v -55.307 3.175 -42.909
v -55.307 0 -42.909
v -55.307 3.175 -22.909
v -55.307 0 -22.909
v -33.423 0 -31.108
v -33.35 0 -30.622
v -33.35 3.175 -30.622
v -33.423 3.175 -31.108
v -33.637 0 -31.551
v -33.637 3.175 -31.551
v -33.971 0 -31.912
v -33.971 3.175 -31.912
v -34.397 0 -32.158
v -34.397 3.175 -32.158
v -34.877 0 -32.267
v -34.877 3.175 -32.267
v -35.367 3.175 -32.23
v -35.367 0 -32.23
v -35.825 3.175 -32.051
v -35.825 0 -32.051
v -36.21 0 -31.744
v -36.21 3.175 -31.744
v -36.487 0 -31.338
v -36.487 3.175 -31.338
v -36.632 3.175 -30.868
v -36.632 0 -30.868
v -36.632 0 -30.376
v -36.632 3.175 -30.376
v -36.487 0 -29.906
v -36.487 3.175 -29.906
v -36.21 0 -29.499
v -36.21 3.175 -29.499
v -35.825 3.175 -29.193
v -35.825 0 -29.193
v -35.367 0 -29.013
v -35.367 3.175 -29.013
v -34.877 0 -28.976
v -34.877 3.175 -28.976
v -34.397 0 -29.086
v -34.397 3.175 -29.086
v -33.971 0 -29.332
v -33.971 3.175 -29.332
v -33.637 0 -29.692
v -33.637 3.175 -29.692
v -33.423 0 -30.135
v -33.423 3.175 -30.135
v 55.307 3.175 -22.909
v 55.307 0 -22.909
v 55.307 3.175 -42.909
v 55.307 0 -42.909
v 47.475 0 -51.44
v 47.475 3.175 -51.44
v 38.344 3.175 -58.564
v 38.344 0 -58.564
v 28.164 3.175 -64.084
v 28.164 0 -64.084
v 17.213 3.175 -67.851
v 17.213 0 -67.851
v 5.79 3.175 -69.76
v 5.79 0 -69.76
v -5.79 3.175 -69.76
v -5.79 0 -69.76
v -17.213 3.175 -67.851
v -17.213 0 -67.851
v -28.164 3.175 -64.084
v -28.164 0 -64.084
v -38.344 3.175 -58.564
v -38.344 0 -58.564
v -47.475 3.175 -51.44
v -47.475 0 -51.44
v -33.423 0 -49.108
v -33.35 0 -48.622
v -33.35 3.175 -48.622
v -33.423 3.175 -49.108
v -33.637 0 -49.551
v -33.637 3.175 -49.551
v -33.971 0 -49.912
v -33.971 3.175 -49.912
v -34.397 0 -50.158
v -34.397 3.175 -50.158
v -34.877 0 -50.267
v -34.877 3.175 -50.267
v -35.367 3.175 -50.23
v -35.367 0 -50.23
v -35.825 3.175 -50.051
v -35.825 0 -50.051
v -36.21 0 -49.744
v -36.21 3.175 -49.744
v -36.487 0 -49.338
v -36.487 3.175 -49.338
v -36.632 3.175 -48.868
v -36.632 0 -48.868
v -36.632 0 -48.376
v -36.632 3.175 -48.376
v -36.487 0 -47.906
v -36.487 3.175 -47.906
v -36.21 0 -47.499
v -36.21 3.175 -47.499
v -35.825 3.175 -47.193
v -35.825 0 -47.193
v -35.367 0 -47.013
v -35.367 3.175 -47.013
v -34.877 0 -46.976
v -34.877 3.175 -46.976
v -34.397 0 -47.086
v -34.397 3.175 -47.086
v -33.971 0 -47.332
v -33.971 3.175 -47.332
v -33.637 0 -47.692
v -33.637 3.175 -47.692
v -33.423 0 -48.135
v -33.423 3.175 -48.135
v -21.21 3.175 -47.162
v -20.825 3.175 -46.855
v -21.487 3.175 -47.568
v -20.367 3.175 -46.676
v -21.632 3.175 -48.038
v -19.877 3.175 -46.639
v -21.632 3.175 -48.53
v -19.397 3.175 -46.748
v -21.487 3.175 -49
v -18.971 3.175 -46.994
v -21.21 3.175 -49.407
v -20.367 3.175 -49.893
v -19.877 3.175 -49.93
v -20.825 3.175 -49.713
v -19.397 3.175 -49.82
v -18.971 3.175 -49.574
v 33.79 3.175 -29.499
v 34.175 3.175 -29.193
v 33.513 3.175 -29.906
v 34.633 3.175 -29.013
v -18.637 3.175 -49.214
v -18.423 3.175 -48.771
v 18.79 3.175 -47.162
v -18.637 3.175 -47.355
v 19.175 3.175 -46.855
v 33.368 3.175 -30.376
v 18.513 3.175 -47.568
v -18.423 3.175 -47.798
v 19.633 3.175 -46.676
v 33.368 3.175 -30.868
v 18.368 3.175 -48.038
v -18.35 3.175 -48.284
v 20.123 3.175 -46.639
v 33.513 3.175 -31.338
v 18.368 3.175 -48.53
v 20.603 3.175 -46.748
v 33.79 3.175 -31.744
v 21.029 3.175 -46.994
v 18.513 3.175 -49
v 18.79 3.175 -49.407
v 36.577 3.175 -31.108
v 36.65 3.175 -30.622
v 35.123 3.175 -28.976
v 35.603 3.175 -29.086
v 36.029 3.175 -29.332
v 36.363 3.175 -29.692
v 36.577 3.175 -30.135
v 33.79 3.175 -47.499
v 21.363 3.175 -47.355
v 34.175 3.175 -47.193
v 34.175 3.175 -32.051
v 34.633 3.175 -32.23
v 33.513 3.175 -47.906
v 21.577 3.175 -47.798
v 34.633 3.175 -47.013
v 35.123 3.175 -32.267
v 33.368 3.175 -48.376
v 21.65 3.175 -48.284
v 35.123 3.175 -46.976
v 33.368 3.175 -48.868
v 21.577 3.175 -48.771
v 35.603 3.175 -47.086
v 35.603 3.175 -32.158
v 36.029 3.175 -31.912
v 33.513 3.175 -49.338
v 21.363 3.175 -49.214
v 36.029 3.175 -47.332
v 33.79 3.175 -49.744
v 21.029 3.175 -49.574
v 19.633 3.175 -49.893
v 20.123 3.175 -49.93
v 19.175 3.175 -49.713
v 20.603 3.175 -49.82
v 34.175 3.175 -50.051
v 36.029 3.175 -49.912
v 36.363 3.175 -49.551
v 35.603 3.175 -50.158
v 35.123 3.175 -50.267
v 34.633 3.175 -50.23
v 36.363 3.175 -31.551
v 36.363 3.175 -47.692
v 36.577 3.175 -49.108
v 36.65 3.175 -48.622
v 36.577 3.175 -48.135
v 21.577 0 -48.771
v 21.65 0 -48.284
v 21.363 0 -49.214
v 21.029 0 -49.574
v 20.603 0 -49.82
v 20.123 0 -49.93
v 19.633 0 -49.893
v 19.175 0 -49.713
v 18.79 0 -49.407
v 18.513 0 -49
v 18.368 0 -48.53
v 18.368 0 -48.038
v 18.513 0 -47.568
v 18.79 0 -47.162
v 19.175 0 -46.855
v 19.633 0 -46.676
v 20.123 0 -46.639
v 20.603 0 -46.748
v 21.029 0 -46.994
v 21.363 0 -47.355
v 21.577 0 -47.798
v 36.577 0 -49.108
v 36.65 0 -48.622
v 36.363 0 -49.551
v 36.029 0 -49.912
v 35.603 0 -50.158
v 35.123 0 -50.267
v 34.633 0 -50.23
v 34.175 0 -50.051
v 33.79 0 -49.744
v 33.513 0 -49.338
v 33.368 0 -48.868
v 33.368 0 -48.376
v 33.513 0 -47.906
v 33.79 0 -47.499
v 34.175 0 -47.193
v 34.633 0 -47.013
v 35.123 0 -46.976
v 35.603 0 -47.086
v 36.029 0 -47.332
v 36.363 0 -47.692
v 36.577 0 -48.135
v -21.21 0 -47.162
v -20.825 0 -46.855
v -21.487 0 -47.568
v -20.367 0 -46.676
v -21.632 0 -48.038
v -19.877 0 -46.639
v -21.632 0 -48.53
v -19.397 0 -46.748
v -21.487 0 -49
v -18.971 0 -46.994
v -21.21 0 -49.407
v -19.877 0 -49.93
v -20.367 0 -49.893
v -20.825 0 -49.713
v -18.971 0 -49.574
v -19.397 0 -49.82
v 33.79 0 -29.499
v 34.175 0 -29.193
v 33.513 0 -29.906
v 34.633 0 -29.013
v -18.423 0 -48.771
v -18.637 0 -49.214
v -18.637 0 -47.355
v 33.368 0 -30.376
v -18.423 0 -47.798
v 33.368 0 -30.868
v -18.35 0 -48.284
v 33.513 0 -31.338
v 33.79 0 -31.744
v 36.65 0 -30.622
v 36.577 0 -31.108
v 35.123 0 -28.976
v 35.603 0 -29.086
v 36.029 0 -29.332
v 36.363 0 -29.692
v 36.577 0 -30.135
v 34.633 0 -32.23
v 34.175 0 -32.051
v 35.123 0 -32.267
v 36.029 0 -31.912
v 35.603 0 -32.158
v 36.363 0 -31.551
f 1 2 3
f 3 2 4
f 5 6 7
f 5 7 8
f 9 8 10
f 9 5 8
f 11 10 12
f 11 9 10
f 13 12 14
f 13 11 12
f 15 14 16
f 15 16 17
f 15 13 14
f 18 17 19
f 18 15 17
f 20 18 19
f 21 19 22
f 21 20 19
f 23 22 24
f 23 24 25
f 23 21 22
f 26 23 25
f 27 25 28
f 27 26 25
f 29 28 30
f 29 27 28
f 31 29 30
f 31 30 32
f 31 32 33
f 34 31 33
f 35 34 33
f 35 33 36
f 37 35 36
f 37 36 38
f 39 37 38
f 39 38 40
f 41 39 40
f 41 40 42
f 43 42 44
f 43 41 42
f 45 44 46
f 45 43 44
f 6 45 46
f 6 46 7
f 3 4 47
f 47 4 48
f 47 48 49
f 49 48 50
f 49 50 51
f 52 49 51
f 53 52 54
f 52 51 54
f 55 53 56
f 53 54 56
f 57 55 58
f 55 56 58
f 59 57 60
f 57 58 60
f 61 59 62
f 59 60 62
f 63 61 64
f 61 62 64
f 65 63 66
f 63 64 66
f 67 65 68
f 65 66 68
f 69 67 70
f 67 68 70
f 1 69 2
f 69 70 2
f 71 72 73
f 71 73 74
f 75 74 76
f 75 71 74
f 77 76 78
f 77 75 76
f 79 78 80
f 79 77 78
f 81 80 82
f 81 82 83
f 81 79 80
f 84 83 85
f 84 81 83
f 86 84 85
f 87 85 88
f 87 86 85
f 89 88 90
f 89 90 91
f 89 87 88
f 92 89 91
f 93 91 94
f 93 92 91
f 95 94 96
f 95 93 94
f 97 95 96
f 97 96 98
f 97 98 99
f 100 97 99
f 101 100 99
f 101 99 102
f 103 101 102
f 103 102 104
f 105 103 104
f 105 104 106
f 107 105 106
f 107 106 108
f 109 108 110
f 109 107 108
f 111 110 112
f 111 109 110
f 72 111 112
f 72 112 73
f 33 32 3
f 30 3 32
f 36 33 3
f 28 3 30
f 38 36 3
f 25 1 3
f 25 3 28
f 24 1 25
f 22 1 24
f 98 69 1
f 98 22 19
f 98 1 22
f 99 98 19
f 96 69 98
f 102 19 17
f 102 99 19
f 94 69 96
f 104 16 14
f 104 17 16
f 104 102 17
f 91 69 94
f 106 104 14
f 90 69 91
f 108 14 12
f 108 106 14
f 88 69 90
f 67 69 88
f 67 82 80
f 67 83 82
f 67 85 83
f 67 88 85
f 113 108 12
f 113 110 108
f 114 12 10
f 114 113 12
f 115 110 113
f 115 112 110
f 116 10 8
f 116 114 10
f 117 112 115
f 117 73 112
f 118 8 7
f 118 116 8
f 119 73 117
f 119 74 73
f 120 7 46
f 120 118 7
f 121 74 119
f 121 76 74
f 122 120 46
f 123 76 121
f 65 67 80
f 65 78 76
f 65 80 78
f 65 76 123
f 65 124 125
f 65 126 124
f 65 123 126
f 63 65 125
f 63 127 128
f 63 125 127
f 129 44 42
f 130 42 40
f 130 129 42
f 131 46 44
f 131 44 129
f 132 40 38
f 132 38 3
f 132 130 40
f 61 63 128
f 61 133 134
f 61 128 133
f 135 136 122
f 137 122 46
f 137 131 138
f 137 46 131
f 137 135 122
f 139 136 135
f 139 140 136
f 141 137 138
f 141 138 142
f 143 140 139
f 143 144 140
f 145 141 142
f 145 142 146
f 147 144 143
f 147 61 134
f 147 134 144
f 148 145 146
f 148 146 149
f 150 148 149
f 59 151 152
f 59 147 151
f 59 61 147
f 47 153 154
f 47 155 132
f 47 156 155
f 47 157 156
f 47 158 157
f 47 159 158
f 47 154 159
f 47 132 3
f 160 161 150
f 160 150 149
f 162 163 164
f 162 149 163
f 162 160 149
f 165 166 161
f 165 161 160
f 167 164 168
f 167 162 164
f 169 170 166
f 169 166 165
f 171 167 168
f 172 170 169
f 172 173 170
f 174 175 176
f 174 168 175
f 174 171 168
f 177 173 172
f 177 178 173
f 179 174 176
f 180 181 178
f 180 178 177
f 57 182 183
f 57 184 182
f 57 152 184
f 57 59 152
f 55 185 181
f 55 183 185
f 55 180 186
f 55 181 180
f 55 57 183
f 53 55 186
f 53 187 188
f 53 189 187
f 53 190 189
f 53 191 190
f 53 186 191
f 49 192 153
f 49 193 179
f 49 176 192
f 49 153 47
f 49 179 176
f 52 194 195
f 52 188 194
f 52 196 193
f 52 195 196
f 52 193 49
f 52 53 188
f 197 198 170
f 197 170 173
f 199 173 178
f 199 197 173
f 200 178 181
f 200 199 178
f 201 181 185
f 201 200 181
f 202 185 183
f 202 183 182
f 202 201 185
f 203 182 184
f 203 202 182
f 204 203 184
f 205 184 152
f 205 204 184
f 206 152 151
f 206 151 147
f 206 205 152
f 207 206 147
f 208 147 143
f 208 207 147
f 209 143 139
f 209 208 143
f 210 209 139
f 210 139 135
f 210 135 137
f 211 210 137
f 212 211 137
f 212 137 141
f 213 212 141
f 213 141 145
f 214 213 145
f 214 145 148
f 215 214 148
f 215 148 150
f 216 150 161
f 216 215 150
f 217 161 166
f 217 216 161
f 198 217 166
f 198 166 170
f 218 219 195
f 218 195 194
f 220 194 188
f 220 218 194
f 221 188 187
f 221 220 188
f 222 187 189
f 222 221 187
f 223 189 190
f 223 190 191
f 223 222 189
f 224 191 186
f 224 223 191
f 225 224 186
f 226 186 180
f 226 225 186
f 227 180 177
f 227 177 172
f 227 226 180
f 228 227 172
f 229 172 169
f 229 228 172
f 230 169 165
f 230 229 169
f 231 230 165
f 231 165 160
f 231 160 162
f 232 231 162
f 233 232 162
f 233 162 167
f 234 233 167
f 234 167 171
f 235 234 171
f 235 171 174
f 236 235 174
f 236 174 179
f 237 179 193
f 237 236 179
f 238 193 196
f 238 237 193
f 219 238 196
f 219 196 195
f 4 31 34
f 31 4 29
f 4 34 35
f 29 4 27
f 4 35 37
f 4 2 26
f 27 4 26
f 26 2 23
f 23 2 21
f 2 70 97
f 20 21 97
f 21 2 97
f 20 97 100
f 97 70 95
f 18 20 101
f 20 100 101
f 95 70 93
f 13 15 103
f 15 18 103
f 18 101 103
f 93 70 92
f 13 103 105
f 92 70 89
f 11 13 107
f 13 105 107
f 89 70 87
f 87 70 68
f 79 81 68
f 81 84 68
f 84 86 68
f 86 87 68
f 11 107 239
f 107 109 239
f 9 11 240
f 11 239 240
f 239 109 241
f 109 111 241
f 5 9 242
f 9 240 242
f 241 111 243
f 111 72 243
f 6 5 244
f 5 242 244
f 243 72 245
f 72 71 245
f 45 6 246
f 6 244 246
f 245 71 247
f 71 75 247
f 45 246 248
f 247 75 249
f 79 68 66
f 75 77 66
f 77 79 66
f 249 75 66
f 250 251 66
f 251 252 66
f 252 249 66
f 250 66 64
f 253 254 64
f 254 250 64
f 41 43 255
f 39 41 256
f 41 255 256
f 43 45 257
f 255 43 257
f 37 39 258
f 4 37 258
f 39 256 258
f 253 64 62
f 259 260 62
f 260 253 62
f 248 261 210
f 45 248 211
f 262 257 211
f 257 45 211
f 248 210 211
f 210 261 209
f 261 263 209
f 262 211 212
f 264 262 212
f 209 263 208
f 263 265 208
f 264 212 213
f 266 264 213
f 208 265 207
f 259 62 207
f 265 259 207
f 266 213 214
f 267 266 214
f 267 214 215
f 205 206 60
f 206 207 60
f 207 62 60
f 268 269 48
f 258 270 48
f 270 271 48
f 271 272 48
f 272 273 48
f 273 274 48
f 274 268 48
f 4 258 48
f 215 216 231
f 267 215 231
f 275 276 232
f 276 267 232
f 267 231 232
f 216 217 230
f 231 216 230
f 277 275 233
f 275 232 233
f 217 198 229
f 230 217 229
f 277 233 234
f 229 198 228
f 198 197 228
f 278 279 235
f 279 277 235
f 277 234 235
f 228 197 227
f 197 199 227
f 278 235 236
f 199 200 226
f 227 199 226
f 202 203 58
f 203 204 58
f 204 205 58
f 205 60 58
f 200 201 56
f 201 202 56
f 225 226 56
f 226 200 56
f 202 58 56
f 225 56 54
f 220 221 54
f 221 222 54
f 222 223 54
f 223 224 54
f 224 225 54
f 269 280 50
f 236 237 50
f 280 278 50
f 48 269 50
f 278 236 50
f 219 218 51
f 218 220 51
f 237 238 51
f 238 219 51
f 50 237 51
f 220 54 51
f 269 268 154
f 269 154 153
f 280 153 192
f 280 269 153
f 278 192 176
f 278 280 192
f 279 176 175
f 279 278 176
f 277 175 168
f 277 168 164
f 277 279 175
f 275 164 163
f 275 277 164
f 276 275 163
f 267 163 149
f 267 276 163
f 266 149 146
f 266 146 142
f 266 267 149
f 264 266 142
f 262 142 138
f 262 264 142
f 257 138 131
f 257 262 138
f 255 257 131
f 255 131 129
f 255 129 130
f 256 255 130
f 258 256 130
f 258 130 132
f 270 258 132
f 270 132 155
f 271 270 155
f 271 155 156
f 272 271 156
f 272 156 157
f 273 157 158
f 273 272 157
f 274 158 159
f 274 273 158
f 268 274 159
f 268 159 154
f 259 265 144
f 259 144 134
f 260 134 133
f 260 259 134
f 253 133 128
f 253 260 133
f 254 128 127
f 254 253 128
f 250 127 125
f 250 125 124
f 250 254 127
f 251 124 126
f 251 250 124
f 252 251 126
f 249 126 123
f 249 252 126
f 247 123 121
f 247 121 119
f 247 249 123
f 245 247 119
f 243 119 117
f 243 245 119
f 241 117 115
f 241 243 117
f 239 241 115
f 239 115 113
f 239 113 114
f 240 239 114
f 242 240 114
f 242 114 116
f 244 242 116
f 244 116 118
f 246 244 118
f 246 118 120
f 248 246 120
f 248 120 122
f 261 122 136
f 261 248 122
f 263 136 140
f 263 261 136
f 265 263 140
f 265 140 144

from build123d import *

# Parameters (mm, degrees)
SKETCH1_R           = 1.65
BOSS_EXTRUDE2_DEPTH = 3.175


with BuildPart() as part:
    # Sketch1 → Boss-Extrude2 (new body)
    with BuildSketch(Plane(origin=(0, 0, 0), x_dir=(1, 0, 0), z_dir=(0, 1, 0))):
        with BuildLine():
            Line((-55.306734792, 42.908799641), (-55.306734792, 22.908799641))
            Line((-55.306734792, 22.908799641), (55.306734792, 22.908799641))
            Line((55.306734792, 22.908799641), (55.306734792, 42.908799641))
            ThreePointArc((55.306734792, 42.908799641), (0, 70), (-55.306734792, 42.908799641))
        make_face()
        with Locations((35, 48.621778265)):
            Circle(SKETCH1_R, mode=Mode.SUBTRACT)
        with Locations((35, 30.621778265)):
            Circle(SKETCH1_R, mode=Mode.SUBTRACT)
        with Locations((-35, 30.621778265)):
            Circle(SKETCH1_R, mode=Mode.SUBTRACT)
        with Locations((-35, 48.621778265)):
            Circle(SKETCH1_R, mode=Mode.SUBTRACT)
        with Locations((20, 48.284271247)):
            Circle(SKETCH1_R, mode=Mode.SUBTRACT)
        with Locations((-20, 48.284271247)):
            Circle(SKETCH1_R, mode=Mode.SUBTRACT)
    extrude(amount=BOSS_EXTRUDE2_DEPTH)


solid = part.part
